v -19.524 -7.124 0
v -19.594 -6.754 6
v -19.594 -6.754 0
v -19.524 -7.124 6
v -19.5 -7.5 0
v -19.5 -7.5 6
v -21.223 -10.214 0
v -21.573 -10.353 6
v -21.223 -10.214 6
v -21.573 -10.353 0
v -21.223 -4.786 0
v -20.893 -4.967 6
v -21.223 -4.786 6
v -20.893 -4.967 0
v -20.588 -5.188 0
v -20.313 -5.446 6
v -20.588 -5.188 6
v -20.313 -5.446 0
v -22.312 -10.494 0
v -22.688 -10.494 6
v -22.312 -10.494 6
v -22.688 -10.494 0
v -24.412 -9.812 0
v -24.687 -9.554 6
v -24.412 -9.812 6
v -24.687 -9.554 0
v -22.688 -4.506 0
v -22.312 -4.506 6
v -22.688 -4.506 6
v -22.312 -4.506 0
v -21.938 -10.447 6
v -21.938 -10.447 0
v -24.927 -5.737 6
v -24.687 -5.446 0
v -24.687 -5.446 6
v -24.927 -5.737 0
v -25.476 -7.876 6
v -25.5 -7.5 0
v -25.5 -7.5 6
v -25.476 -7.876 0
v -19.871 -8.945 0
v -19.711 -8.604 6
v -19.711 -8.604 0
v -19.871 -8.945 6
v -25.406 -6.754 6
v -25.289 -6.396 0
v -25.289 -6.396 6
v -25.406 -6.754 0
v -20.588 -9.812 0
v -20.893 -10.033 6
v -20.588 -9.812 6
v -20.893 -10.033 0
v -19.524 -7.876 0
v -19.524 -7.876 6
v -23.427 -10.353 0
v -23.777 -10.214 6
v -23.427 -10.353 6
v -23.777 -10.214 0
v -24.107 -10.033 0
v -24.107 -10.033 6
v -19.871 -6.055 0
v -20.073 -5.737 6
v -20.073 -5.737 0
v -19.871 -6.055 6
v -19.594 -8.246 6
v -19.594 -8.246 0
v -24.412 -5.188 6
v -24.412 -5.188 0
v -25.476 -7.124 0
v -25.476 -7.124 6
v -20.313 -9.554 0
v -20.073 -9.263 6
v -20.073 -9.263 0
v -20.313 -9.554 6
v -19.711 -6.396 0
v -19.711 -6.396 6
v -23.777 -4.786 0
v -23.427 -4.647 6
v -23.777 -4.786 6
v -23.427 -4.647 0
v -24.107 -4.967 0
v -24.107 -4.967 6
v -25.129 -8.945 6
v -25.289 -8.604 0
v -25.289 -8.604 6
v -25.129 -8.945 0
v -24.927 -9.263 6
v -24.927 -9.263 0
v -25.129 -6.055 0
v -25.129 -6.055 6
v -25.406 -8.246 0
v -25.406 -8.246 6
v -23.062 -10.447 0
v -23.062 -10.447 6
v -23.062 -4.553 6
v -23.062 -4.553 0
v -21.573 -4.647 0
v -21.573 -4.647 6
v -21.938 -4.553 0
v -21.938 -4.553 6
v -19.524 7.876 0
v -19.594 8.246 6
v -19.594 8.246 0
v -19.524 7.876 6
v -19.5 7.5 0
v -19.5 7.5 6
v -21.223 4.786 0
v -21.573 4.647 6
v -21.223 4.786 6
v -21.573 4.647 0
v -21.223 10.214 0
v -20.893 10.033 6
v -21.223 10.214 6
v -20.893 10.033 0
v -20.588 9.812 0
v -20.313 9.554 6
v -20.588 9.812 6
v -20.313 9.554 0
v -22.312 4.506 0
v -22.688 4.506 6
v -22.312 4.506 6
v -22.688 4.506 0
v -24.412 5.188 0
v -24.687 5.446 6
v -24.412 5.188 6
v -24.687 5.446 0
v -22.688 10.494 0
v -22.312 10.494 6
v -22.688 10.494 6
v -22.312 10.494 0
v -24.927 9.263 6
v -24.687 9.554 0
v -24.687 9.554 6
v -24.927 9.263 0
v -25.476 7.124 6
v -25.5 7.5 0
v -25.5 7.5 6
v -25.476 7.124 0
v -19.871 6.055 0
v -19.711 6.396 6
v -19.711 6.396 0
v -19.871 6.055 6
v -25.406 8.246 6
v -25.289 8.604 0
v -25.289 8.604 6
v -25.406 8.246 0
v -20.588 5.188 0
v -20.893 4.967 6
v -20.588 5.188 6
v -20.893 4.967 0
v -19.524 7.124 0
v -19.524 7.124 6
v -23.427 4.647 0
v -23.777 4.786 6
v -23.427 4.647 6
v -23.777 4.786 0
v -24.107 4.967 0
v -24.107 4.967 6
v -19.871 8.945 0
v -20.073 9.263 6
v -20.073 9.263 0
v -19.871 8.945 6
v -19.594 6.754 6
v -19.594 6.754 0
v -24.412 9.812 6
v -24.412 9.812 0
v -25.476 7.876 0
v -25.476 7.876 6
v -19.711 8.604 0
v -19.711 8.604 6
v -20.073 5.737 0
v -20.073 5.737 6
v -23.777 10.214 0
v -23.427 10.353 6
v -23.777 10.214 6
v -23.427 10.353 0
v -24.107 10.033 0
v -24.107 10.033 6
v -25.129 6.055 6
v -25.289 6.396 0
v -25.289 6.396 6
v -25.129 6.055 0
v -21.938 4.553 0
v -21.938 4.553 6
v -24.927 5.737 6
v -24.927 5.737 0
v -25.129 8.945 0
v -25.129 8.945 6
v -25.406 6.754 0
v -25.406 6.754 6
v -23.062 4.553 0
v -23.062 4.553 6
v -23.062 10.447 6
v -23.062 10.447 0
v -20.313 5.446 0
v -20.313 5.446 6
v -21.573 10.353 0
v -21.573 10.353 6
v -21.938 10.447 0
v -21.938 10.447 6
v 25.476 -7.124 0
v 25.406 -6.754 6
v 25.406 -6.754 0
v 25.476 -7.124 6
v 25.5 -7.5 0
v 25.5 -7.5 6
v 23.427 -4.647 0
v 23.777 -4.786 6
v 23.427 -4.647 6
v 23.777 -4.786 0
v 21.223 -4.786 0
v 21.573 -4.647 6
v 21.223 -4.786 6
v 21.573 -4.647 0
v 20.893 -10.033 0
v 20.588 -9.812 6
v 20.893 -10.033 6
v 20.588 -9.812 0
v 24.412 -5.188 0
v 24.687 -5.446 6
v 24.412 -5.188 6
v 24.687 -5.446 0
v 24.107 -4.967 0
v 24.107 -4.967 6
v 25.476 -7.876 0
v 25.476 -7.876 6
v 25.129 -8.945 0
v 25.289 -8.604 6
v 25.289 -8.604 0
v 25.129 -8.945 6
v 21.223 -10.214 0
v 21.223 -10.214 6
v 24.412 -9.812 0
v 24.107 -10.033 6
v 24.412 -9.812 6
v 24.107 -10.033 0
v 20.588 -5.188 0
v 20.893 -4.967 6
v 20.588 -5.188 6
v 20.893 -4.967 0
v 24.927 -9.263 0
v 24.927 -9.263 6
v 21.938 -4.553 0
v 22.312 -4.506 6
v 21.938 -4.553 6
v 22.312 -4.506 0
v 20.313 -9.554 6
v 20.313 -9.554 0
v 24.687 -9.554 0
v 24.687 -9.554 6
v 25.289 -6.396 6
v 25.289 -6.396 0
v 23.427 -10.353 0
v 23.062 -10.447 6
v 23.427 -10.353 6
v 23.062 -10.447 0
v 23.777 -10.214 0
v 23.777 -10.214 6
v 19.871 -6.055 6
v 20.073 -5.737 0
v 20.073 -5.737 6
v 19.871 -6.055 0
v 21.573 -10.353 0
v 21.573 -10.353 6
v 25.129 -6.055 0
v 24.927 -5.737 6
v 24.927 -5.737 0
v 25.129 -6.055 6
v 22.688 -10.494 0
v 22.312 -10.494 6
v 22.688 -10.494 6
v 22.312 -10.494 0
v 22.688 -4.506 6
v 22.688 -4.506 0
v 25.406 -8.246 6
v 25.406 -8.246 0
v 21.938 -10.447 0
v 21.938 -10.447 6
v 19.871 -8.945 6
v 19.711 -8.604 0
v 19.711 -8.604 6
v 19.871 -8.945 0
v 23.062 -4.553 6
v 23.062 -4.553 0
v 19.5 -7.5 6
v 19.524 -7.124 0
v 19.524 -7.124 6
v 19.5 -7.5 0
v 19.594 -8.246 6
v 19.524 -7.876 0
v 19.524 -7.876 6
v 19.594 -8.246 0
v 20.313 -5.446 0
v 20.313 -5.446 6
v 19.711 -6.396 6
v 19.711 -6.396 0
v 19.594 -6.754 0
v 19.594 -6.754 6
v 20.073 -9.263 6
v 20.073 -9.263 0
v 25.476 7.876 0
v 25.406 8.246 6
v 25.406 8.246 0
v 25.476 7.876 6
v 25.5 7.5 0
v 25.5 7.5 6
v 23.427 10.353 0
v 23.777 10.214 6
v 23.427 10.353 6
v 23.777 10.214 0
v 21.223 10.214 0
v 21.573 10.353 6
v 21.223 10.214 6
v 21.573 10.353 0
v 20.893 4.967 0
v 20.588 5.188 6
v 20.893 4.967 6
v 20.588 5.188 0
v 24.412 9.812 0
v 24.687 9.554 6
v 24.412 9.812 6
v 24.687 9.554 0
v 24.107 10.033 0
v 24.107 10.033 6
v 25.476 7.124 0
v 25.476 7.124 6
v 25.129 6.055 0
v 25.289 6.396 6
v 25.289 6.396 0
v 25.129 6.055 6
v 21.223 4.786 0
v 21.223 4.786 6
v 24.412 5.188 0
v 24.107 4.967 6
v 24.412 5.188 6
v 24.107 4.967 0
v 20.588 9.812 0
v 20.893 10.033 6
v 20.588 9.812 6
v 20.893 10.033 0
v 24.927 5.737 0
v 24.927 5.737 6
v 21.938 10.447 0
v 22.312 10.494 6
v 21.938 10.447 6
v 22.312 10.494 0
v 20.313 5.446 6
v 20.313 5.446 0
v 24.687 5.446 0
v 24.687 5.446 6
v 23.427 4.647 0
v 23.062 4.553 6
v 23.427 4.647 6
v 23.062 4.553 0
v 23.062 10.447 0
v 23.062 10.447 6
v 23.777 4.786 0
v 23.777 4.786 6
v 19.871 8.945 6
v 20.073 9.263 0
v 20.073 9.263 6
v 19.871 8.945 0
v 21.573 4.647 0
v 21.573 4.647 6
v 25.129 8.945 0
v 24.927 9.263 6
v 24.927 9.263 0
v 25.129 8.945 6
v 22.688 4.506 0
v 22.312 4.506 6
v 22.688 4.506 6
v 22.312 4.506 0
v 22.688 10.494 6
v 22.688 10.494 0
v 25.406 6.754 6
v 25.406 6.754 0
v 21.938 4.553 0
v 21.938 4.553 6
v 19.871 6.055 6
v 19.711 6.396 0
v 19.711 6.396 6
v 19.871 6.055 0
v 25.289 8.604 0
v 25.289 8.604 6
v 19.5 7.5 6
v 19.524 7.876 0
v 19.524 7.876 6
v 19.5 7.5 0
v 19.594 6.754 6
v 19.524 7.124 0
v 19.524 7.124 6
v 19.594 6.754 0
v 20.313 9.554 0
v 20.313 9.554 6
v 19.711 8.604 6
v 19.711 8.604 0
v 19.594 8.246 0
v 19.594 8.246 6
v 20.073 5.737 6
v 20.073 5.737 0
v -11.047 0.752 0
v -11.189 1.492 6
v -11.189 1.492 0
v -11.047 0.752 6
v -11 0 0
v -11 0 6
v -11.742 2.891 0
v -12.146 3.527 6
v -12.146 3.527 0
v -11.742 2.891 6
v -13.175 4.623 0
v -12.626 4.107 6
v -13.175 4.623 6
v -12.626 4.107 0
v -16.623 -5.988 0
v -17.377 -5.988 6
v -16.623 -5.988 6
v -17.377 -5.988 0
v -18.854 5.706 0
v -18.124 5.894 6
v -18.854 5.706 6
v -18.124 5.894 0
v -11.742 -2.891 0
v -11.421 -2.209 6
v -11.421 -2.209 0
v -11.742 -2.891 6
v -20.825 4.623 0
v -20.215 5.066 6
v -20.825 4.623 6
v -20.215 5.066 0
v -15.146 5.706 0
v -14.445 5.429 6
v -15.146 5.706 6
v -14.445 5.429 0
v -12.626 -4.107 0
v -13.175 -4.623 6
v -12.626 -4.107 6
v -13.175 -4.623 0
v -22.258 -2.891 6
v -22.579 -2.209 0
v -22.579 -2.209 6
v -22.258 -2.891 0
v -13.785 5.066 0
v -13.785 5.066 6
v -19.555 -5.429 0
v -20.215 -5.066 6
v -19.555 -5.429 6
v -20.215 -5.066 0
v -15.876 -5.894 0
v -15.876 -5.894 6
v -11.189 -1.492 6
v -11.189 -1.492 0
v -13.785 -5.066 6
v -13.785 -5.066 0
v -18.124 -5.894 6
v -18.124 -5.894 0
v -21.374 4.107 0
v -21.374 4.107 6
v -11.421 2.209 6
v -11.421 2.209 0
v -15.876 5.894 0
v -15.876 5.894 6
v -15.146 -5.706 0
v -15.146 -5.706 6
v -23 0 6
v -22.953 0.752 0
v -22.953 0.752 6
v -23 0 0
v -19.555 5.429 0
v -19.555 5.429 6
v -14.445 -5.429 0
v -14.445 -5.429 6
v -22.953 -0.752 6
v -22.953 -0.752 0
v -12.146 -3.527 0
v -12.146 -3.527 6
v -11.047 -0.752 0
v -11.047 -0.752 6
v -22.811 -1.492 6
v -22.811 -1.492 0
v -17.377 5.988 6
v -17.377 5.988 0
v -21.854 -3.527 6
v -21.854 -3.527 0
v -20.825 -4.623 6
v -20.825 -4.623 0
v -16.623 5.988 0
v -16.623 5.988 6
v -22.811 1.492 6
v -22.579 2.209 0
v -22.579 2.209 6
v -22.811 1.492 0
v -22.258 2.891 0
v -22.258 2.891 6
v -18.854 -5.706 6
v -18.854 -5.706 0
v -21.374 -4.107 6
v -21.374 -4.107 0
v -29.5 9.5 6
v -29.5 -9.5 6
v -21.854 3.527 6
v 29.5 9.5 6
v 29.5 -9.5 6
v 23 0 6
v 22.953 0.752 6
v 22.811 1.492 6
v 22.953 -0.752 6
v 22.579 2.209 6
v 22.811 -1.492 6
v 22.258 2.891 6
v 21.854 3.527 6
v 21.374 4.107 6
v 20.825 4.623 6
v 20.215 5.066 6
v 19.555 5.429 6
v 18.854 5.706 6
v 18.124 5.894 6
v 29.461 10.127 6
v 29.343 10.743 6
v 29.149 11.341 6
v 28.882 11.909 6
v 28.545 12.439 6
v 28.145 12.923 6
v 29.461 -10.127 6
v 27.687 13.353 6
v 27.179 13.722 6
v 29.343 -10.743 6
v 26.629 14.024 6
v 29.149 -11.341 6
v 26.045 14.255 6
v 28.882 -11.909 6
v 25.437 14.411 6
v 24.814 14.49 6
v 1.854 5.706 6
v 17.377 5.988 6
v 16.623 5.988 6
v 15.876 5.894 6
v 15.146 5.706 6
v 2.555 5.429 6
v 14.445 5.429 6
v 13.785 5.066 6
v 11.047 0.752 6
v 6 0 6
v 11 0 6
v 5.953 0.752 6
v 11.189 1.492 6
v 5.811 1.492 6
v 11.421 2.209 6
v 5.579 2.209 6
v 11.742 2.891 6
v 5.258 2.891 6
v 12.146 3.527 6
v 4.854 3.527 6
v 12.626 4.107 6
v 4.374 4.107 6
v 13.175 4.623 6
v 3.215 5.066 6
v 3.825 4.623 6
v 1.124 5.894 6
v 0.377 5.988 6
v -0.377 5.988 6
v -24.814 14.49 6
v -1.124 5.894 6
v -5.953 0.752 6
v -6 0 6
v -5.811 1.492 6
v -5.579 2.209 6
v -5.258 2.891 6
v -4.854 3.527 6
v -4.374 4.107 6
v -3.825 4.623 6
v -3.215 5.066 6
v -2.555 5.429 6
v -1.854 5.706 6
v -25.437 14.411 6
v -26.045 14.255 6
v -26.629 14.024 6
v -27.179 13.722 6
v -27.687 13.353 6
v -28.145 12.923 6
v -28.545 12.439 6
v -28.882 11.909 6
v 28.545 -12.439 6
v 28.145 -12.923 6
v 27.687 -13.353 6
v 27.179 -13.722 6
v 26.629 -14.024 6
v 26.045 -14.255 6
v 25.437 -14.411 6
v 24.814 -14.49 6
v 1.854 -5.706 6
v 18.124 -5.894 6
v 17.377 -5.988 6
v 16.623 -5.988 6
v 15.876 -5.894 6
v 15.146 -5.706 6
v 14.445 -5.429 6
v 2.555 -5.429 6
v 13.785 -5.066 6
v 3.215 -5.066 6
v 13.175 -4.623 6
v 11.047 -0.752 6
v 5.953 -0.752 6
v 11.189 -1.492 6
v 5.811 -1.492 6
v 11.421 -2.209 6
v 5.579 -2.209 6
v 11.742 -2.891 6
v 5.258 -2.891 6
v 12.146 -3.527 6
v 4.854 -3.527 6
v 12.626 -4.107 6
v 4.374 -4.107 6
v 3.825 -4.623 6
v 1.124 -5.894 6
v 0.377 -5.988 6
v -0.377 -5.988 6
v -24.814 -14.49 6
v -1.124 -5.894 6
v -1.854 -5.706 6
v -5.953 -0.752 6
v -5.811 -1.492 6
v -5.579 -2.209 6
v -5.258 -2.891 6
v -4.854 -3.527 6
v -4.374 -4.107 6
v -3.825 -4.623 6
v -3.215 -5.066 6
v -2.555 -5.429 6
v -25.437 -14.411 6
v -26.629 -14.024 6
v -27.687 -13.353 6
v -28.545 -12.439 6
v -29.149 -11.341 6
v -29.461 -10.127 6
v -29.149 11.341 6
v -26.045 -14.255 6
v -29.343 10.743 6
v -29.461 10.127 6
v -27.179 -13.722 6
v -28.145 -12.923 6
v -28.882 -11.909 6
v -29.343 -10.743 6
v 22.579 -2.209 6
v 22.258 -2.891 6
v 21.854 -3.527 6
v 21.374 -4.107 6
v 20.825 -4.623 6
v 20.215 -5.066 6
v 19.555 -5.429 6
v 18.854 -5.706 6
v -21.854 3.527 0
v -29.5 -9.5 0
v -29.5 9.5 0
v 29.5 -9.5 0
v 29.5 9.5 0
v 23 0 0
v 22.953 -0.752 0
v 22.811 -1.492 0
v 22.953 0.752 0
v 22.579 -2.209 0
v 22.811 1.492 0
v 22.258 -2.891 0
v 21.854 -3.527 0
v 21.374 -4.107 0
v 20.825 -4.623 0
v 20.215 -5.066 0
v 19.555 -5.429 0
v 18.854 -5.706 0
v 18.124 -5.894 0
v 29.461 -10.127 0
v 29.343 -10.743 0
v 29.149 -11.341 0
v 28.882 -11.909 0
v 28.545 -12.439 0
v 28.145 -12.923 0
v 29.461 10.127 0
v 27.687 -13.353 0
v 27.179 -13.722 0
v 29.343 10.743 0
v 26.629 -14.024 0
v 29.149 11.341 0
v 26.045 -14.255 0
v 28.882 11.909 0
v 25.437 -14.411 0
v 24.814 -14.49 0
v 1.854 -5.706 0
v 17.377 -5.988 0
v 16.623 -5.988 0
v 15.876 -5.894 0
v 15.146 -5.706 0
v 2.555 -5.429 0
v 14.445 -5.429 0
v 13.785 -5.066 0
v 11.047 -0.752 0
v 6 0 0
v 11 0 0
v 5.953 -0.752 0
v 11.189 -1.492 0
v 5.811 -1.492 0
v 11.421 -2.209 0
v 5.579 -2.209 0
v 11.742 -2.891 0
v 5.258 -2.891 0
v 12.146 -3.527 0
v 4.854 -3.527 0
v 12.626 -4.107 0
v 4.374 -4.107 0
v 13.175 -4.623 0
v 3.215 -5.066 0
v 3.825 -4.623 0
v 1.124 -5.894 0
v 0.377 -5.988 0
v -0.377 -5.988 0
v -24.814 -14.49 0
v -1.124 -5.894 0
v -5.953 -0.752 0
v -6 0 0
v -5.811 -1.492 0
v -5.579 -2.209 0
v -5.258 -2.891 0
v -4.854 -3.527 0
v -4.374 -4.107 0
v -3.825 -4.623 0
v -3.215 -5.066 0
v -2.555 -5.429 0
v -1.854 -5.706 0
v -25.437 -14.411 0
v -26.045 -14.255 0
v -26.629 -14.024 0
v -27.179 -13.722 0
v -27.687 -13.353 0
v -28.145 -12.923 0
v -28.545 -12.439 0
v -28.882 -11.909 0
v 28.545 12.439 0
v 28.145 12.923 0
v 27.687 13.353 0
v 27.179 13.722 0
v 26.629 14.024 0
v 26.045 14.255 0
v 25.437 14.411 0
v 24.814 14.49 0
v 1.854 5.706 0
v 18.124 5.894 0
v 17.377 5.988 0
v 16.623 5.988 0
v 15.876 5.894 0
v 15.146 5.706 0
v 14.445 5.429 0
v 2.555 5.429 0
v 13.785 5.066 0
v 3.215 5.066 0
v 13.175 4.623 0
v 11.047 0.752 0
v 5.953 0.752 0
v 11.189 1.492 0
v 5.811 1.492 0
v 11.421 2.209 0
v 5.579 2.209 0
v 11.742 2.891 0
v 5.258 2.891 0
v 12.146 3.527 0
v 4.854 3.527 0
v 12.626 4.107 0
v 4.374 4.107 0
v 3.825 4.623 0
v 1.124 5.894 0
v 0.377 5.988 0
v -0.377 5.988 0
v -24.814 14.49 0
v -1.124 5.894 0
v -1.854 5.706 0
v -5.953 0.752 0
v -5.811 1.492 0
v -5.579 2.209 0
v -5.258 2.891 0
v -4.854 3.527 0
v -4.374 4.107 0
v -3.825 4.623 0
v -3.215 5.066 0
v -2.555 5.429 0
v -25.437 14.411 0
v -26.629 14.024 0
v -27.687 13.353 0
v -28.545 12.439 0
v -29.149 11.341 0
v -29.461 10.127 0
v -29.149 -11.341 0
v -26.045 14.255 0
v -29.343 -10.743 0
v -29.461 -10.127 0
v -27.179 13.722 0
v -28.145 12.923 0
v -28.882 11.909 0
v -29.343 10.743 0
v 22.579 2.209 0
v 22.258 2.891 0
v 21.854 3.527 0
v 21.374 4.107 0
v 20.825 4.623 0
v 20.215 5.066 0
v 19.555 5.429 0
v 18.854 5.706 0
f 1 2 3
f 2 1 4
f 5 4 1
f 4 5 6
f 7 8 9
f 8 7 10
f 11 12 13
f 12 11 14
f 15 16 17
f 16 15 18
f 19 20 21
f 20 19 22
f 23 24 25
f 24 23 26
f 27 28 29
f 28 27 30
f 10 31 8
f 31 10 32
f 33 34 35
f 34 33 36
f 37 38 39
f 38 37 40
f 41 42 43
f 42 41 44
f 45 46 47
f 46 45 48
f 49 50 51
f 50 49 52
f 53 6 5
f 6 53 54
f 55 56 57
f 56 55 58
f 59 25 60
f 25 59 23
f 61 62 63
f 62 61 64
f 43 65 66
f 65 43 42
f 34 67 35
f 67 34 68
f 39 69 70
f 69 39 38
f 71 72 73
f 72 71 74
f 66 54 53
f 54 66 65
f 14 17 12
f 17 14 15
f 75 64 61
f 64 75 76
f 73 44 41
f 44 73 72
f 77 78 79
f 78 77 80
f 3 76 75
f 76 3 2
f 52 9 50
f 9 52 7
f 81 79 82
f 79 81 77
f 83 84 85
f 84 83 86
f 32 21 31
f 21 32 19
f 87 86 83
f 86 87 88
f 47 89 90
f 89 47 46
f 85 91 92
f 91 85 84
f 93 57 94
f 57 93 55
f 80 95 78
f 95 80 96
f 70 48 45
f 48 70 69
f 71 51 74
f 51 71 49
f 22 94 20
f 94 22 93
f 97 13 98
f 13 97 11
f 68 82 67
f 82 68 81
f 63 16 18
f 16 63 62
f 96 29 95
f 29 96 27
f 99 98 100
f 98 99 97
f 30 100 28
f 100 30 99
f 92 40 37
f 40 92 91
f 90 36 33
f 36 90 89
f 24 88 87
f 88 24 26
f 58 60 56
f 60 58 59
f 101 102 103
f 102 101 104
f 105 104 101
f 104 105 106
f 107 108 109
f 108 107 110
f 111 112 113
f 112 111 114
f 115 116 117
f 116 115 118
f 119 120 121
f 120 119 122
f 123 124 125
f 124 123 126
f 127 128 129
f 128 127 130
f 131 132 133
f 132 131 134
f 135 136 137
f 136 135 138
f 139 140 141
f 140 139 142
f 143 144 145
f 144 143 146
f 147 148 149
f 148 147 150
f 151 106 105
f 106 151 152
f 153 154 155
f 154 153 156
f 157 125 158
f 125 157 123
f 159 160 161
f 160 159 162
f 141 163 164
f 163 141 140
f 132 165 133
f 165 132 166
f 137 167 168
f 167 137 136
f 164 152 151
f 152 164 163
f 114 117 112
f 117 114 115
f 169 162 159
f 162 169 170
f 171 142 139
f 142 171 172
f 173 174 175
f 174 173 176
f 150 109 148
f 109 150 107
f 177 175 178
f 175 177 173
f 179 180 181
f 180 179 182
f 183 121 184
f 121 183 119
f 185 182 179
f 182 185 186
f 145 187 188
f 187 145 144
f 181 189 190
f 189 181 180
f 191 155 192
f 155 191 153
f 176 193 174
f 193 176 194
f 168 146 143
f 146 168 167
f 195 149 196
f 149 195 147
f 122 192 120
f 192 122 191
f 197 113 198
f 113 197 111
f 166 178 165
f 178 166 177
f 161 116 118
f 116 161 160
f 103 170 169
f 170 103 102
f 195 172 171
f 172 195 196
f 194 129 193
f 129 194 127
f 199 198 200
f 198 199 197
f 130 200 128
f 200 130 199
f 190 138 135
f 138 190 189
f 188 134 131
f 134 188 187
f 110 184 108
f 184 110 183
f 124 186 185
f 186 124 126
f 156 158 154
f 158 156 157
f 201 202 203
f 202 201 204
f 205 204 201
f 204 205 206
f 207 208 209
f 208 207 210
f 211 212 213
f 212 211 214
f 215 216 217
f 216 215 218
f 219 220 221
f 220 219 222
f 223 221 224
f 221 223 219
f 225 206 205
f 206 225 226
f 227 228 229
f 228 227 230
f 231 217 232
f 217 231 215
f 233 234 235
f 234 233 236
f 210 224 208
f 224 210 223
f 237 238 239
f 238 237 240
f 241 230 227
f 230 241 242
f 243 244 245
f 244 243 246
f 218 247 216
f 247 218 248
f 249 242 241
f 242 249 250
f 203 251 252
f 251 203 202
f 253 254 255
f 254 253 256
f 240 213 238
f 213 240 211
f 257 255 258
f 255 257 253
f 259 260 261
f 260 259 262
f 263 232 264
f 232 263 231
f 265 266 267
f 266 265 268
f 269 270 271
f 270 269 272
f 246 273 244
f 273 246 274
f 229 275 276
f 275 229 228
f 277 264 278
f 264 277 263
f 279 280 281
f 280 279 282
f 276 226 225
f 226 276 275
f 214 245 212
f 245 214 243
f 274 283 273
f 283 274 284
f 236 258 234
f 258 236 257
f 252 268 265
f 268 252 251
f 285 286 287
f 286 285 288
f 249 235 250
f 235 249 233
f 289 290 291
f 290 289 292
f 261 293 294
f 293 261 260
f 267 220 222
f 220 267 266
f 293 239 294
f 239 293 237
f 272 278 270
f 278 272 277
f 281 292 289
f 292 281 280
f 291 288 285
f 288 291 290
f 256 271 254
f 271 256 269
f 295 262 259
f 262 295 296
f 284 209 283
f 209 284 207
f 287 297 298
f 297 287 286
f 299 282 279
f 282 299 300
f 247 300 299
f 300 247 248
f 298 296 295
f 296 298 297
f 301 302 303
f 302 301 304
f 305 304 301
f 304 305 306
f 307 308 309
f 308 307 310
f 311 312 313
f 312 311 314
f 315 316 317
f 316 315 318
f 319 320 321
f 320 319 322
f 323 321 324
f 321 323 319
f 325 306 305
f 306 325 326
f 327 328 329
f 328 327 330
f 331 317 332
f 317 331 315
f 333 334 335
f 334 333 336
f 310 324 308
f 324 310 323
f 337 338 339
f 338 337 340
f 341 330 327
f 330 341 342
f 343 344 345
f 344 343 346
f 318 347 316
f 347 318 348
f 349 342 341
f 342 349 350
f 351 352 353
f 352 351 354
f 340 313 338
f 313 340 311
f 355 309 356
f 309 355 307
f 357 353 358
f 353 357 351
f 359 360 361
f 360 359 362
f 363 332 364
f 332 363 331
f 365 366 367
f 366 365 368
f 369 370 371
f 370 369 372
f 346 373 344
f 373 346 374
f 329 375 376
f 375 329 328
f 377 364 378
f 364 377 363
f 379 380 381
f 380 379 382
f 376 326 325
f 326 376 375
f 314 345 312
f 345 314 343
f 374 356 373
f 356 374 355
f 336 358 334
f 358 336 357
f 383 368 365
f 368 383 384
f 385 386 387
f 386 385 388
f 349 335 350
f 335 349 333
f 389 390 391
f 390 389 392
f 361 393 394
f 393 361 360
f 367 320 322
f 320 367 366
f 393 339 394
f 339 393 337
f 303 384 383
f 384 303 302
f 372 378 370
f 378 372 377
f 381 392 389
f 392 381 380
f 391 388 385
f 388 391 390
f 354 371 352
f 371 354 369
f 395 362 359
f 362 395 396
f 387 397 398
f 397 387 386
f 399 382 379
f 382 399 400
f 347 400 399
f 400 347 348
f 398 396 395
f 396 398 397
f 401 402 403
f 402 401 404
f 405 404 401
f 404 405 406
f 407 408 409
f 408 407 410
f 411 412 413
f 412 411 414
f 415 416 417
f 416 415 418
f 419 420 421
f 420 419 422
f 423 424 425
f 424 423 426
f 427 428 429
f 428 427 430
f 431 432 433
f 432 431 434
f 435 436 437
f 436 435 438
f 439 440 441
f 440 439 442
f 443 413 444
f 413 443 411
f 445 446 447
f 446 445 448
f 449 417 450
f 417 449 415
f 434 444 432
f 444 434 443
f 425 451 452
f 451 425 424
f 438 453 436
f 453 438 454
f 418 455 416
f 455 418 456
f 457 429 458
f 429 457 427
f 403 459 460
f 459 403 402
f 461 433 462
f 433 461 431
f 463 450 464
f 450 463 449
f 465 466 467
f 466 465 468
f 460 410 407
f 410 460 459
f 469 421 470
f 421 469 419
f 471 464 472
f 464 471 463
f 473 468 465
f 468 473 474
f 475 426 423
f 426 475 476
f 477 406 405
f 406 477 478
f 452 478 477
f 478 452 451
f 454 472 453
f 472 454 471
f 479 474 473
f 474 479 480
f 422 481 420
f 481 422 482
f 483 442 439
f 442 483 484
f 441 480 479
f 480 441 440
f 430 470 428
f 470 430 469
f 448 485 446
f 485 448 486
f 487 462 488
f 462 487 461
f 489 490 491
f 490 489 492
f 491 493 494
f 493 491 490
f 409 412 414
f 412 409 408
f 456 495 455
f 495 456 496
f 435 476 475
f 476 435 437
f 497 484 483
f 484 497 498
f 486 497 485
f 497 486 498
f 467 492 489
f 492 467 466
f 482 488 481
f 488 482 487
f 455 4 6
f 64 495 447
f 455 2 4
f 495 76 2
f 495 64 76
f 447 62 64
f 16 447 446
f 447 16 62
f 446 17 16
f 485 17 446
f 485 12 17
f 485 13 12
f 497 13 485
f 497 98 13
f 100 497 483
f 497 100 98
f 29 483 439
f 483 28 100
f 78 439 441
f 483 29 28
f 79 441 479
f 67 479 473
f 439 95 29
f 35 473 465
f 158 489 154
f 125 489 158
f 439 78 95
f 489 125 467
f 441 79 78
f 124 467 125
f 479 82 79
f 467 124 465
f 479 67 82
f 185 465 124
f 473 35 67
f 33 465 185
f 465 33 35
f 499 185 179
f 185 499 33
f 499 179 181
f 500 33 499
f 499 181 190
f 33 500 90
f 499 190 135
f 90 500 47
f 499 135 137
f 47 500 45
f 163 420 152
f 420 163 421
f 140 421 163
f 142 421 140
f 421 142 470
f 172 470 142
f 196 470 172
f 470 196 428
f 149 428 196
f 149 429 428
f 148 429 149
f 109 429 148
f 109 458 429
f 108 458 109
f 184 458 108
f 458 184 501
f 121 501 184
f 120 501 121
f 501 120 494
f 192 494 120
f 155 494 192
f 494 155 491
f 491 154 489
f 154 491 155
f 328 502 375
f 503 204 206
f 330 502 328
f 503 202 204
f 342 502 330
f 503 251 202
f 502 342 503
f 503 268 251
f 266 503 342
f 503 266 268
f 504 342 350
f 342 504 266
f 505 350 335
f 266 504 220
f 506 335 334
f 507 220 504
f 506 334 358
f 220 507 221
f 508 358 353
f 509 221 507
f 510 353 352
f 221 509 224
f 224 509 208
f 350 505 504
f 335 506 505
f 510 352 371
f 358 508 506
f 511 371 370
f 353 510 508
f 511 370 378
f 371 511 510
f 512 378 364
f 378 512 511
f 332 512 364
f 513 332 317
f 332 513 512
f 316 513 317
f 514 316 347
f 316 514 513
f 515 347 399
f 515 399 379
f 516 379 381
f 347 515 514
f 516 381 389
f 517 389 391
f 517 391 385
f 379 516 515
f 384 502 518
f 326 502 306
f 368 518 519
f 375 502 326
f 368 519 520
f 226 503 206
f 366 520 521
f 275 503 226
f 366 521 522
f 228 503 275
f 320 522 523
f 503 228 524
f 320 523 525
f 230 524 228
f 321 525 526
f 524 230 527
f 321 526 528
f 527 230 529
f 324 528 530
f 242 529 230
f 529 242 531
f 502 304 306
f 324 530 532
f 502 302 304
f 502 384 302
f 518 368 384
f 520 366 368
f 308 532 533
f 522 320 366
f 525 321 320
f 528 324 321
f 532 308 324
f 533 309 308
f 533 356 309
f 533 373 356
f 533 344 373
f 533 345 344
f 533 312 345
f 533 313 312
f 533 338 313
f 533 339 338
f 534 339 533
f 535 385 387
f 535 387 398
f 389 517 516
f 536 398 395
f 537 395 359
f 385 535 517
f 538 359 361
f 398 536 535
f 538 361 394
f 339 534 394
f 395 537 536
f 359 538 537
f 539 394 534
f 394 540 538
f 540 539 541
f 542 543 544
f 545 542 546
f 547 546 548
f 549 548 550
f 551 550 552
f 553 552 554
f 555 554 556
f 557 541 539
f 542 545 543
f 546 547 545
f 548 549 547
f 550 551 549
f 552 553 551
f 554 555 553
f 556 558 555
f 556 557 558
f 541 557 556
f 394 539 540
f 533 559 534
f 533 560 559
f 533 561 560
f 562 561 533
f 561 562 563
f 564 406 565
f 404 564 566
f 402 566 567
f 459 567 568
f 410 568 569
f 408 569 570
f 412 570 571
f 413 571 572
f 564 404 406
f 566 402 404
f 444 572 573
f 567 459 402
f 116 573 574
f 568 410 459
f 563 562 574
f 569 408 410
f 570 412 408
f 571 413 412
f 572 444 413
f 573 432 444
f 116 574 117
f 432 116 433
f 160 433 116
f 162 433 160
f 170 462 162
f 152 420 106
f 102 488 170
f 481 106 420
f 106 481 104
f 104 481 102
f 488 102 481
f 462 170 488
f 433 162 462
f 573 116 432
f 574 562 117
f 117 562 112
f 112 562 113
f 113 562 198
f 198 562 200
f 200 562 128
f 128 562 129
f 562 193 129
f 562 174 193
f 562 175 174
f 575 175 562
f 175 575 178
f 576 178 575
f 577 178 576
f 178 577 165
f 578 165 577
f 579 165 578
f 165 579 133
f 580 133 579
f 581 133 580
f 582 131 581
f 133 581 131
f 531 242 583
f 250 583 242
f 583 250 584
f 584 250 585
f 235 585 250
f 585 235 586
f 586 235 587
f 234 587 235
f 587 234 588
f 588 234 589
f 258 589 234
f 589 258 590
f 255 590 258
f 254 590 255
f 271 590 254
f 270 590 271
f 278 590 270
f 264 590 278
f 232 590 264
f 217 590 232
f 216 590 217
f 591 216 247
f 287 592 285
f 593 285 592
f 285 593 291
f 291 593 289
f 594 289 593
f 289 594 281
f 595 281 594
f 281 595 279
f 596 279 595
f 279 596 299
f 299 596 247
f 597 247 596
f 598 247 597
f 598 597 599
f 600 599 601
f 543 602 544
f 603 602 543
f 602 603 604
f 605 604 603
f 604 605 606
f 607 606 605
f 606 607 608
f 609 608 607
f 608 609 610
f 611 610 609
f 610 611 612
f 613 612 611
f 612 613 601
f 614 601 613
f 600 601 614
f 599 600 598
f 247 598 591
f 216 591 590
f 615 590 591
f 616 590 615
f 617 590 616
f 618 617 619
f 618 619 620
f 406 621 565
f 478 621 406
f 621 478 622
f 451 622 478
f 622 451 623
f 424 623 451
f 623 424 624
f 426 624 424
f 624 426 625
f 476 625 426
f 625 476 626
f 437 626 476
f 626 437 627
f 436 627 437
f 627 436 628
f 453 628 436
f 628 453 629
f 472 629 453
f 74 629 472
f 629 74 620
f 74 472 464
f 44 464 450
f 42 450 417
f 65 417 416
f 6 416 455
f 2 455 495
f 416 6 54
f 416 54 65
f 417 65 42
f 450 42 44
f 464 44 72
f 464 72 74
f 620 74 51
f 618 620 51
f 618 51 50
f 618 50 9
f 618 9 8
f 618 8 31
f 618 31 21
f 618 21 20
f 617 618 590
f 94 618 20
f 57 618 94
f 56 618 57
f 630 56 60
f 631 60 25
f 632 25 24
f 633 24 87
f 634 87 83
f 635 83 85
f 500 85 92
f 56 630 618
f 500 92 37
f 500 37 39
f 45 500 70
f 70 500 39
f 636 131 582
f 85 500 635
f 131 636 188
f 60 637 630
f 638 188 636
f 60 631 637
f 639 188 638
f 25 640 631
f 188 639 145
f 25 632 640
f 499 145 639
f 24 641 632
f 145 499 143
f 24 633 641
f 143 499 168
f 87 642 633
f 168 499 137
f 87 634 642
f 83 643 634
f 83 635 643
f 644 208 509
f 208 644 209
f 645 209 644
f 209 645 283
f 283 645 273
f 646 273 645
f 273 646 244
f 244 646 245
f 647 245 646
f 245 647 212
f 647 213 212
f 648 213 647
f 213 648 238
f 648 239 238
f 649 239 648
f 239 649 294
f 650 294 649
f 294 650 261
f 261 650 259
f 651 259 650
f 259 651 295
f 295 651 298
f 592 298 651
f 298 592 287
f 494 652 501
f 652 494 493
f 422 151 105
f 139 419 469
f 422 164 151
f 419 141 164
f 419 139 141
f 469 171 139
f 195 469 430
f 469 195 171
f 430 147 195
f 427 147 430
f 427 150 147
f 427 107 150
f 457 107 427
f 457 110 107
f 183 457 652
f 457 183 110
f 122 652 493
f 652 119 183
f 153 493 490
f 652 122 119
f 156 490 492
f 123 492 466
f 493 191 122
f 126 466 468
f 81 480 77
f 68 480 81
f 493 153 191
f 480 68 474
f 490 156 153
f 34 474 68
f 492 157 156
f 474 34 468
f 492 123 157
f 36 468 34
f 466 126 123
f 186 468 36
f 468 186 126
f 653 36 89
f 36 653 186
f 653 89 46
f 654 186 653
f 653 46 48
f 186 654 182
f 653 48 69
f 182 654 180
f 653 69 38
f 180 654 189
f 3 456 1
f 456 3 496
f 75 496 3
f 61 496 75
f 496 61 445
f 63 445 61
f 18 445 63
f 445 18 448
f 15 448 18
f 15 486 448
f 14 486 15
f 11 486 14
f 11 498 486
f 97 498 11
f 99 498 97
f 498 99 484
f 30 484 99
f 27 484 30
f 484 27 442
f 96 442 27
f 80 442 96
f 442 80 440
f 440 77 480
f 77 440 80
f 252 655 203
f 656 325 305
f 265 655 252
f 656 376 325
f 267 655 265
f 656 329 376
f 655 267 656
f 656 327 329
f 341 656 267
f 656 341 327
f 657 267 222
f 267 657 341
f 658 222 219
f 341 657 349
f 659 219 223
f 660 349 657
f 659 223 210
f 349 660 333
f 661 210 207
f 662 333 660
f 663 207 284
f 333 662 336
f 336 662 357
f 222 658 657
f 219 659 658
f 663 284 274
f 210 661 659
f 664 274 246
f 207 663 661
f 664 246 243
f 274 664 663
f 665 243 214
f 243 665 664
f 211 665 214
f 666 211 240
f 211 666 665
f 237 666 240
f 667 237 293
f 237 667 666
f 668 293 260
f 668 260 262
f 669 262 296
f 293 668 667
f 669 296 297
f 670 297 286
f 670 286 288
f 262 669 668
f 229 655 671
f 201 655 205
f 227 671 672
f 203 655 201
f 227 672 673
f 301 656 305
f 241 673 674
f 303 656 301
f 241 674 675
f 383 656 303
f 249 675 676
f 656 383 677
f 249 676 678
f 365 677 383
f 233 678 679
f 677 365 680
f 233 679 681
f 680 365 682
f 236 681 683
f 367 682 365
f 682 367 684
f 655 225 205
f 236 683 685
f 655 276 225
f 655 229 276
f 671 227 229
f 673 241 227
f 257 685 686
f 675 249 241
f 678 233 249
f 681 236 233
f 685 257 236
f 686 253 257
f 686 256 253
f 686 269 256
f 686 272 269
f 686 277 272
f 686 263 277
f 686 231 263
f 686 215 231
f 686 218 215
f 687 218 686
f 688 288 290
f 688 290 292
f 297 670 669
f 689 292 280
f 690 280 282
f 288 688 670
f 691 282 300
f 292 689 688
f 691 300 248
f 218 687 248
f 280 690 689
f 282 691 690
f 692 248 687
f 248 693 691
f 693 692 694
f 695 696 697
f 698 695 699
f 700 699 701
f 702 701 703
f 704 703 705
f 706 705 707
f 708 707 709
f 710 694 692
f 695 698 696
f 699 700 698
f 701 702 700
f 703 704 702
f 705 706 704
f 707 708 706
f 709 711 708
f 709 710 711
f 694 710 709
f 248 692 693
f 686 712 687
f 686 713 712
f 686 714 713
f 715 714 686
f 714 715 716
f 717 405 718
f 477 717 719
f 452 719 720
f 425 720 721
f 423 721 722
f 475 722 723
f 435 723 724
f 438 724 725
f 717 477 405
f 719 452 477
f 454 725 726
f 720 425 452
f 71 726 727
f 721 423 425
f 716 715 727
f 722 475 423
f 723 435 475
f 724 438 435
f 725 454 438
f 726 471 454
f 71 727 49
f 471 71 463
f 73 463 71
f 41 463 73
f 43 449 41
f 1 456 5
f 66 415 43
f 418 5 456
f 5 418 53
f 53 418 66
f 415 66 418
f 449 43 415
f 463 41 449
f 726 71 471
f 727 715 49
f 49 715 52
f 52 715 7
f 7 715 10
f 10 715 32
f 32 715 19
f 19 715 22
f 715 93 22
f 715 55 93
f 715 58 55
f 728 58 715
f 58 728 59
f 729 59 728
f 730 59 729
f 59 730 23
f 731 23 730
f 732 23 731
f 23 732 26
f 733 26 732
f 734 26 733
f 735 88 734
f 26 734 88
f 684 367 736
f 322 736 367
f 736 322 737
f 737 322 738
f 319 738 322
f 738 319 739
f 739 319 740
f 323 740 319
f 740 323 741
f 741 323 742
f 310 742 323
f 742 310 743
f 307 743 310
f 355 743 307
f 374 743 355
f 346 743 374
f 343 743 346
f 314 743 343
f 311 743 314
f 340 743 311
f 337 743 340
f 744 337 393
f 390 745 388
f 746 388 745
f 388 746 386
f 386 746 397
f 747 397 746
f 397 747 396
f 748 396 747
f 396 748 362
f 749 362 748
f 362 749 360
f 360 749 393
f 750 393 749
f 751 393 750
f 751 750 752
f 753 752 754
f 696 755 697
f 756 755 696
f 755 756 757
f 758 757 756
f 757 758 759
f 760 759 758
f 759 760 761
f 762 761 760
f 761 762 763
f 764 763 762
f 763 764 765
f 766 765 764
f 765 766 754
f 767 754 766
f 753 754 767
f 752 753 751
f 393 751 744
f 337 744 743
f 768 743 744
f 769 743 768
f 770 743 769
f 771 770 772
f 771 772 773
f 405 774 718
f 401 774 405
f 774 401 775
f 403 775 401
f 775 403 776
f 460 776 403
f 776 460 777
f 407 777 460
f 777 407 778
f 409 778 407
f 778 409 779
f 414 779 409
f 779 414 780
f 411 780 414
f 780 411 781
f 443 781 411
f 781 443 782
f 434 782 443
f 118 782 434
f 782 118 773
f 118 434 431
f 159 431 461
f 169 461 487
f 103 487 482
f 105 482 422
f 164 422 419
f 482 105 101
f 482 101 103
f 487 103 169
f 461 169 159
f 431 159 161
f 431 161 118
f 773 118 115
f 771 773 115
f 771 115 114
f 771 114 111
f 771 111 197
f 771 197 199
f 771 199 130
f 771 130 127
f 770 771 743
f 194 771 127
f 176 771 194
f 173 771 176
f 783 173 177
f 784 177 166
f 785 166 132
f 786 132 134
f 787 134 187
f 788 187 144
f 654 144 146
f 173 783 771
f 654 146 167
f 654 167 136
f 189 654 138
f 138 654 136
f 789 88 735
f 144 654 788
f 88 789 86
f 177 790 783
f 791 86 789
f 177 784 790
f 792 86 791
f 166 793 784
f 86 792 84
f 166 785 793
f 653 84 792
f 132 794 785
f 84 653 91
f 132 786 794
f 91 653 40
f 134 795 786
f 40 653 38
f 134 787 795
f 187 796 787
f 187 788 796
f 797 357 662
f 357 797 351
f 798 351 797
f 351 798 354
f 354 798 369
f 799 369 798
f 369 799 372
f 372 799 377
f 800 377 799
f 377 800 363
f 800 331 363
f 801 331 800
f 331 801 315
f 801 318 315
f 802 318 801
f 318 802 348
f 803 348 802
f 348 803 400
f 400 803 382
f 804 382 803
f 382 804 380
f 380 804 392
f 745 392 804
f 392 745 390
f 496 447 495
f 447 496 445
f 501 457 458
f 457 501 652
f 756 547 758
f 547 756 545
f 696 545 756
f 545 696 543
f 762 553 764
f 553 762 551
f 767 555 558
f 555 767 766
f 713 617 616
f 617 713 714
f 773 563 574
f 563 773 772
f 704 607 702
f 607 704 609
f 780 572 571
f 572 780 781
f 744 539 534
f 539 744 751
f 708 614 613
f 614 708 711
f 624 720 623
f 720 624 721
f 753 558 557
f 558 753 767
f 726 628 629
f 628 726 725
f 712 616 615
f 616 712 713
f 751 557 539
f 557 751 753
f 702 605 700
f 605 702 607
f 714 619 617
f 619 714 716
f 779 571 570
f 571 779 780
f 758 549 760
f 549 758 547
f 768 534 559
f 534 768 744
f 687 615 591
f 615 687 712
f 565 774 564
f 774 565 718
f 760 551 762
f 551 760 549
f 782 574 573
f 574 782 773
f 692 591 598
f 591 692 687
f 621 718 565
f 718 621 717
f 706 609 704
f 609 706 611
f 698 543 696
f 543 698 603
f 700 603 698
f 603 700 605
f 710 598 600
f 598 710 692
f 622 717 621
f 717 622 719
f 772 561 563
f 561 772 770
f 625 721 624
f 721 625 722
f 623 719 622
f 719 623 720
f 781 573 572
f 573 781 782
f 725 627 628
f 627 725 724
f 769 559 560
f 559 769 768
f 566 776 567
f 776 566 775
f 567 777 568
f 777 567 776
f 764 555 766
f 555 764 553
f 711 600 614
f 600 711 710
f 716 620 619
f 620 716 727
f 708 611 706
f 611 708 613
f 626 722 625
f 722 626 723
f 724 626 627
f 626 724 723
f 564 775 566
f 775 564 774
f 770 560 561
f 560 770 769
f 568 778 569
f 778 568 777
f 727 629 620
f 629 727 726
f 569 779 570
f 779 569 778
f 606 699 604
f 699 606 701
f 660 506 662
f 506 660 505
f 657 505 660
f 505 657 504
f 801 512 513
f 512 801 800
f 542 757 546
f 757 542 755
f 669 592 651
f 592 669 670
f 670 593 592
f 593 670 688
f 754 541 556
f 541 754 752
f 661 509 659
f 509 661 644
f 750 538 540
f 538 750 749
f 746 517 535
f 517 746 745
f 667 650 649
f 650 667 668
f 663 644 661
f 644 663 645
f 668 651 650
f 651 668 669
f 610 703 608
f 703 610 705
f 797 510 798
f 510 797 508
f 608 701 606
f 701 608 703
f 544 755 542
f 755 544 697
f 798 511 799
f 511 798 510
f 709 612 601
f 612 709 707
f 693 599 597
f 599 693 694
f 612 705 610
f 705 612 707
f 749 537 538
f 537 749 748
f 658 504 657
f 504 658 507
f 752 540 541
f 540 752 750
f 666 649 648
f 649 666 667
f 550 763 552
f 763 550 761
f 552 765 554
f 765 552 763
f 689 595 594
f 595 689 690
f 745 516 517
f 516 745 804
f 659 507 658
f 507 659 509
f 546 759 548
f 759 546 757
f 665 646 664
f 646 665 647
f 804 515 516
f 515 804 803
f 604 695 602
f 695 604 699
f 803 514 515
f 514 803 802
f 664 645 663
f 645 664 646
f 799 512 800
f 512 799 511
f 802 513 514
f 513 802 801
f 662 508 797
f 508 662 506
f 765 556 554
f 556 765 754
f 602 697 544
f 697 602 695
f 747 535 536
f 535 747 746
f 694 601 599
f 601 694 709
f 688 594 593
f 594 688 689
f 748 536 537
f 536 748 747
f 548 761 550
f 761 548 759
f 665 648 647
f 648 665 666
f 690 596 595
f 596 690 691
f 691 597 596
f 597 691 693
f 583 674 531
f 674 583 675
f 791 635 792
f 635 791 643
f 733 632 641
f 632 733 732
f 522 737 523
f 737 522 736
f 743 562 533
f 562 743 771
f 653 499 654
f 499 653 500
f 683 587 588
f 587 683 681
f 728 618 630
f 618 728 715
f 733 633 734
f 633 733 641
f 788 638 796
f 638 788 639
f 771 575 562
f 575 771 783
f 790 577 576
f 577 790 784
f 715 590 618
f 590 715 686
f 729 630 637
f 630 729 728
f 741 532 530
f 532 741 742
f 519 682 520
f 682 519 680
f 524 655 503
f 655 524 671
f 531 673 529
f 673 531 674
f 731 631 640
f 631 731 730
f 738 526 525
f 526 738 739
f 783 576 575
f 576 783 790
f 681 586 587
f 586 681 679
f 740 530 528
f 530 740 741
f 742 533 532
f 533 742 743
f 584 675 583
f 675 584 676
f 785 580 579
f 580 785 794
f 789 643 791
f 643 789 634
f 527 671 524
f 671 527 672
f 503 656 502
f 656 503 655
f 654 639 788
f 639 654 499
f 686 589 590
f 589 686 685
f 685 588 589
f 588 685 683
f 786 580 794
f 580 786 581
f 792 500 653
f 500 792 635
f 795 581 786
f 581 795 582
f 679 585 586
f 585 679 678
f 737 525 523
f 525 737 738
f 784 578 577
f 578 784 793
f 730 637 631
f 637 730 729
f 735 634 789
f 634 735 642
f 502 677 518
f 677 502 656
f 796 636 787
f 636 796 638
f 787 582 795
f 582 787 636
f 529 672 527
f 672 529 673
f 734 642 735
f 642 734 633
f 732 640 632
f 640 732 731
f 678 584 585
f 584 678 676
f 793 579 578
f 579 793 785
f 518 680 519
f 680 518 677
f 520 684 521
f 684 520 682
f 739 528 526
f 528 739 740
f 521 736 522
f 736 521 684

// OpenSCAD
$fn = 50;


difference() {
	union() {
		hull() {
			translate(v = [-24.5000000000, 9.5000000000, 0]) {
				cylinder(h = 6, r = 5);
			}
			translate(v = [24.5000000000, 9.5000000000, 0]) {
				cylinder(h = 6, r = 5);
			}
			translate(v = [-24.5000000000, -9.5000000000, 0]) {
				cylinder(h = 6, r = 5);
			}
			translate(v = [24.5000000000, -9.5000000000, 0]) {
				cylinder(h = 6, r = 5);
			}
		}
	}
	union() {
		#translate(v = [-22.5000000000, -7.5000000000, -100.0000000000]) {
			cylinder(h = 200, r = 3.0000000000);
		}
		#translate(v = [-22.5000000000, 7.5000000000, -100.0000000000]) {
			cylinder(h = 200, r = 3.0000000000);
		}
		#translate(v = [22.5000000000, -7.5000000000, -100.0000000000]) {
			cylinder(h = 200, r = 3.0000000000);
		}
		#translate(v = [22.5000000000, 7.5000000000, -100.0000000000]) {
			cylinder(h = 200, r = 3.0000000000);
		}
		#translate(v = [-17.0000000000, 0, 0]) {
			cylinder(h = 6, r = 6.0000000000);
		}
		#cylinder(h = 6, r = 6.0000000000);
		#translate(v = [17.0000000000, 0, 0]) {
			cylinder(h = 6, r = 6.0000000000);
		}
	}
}
